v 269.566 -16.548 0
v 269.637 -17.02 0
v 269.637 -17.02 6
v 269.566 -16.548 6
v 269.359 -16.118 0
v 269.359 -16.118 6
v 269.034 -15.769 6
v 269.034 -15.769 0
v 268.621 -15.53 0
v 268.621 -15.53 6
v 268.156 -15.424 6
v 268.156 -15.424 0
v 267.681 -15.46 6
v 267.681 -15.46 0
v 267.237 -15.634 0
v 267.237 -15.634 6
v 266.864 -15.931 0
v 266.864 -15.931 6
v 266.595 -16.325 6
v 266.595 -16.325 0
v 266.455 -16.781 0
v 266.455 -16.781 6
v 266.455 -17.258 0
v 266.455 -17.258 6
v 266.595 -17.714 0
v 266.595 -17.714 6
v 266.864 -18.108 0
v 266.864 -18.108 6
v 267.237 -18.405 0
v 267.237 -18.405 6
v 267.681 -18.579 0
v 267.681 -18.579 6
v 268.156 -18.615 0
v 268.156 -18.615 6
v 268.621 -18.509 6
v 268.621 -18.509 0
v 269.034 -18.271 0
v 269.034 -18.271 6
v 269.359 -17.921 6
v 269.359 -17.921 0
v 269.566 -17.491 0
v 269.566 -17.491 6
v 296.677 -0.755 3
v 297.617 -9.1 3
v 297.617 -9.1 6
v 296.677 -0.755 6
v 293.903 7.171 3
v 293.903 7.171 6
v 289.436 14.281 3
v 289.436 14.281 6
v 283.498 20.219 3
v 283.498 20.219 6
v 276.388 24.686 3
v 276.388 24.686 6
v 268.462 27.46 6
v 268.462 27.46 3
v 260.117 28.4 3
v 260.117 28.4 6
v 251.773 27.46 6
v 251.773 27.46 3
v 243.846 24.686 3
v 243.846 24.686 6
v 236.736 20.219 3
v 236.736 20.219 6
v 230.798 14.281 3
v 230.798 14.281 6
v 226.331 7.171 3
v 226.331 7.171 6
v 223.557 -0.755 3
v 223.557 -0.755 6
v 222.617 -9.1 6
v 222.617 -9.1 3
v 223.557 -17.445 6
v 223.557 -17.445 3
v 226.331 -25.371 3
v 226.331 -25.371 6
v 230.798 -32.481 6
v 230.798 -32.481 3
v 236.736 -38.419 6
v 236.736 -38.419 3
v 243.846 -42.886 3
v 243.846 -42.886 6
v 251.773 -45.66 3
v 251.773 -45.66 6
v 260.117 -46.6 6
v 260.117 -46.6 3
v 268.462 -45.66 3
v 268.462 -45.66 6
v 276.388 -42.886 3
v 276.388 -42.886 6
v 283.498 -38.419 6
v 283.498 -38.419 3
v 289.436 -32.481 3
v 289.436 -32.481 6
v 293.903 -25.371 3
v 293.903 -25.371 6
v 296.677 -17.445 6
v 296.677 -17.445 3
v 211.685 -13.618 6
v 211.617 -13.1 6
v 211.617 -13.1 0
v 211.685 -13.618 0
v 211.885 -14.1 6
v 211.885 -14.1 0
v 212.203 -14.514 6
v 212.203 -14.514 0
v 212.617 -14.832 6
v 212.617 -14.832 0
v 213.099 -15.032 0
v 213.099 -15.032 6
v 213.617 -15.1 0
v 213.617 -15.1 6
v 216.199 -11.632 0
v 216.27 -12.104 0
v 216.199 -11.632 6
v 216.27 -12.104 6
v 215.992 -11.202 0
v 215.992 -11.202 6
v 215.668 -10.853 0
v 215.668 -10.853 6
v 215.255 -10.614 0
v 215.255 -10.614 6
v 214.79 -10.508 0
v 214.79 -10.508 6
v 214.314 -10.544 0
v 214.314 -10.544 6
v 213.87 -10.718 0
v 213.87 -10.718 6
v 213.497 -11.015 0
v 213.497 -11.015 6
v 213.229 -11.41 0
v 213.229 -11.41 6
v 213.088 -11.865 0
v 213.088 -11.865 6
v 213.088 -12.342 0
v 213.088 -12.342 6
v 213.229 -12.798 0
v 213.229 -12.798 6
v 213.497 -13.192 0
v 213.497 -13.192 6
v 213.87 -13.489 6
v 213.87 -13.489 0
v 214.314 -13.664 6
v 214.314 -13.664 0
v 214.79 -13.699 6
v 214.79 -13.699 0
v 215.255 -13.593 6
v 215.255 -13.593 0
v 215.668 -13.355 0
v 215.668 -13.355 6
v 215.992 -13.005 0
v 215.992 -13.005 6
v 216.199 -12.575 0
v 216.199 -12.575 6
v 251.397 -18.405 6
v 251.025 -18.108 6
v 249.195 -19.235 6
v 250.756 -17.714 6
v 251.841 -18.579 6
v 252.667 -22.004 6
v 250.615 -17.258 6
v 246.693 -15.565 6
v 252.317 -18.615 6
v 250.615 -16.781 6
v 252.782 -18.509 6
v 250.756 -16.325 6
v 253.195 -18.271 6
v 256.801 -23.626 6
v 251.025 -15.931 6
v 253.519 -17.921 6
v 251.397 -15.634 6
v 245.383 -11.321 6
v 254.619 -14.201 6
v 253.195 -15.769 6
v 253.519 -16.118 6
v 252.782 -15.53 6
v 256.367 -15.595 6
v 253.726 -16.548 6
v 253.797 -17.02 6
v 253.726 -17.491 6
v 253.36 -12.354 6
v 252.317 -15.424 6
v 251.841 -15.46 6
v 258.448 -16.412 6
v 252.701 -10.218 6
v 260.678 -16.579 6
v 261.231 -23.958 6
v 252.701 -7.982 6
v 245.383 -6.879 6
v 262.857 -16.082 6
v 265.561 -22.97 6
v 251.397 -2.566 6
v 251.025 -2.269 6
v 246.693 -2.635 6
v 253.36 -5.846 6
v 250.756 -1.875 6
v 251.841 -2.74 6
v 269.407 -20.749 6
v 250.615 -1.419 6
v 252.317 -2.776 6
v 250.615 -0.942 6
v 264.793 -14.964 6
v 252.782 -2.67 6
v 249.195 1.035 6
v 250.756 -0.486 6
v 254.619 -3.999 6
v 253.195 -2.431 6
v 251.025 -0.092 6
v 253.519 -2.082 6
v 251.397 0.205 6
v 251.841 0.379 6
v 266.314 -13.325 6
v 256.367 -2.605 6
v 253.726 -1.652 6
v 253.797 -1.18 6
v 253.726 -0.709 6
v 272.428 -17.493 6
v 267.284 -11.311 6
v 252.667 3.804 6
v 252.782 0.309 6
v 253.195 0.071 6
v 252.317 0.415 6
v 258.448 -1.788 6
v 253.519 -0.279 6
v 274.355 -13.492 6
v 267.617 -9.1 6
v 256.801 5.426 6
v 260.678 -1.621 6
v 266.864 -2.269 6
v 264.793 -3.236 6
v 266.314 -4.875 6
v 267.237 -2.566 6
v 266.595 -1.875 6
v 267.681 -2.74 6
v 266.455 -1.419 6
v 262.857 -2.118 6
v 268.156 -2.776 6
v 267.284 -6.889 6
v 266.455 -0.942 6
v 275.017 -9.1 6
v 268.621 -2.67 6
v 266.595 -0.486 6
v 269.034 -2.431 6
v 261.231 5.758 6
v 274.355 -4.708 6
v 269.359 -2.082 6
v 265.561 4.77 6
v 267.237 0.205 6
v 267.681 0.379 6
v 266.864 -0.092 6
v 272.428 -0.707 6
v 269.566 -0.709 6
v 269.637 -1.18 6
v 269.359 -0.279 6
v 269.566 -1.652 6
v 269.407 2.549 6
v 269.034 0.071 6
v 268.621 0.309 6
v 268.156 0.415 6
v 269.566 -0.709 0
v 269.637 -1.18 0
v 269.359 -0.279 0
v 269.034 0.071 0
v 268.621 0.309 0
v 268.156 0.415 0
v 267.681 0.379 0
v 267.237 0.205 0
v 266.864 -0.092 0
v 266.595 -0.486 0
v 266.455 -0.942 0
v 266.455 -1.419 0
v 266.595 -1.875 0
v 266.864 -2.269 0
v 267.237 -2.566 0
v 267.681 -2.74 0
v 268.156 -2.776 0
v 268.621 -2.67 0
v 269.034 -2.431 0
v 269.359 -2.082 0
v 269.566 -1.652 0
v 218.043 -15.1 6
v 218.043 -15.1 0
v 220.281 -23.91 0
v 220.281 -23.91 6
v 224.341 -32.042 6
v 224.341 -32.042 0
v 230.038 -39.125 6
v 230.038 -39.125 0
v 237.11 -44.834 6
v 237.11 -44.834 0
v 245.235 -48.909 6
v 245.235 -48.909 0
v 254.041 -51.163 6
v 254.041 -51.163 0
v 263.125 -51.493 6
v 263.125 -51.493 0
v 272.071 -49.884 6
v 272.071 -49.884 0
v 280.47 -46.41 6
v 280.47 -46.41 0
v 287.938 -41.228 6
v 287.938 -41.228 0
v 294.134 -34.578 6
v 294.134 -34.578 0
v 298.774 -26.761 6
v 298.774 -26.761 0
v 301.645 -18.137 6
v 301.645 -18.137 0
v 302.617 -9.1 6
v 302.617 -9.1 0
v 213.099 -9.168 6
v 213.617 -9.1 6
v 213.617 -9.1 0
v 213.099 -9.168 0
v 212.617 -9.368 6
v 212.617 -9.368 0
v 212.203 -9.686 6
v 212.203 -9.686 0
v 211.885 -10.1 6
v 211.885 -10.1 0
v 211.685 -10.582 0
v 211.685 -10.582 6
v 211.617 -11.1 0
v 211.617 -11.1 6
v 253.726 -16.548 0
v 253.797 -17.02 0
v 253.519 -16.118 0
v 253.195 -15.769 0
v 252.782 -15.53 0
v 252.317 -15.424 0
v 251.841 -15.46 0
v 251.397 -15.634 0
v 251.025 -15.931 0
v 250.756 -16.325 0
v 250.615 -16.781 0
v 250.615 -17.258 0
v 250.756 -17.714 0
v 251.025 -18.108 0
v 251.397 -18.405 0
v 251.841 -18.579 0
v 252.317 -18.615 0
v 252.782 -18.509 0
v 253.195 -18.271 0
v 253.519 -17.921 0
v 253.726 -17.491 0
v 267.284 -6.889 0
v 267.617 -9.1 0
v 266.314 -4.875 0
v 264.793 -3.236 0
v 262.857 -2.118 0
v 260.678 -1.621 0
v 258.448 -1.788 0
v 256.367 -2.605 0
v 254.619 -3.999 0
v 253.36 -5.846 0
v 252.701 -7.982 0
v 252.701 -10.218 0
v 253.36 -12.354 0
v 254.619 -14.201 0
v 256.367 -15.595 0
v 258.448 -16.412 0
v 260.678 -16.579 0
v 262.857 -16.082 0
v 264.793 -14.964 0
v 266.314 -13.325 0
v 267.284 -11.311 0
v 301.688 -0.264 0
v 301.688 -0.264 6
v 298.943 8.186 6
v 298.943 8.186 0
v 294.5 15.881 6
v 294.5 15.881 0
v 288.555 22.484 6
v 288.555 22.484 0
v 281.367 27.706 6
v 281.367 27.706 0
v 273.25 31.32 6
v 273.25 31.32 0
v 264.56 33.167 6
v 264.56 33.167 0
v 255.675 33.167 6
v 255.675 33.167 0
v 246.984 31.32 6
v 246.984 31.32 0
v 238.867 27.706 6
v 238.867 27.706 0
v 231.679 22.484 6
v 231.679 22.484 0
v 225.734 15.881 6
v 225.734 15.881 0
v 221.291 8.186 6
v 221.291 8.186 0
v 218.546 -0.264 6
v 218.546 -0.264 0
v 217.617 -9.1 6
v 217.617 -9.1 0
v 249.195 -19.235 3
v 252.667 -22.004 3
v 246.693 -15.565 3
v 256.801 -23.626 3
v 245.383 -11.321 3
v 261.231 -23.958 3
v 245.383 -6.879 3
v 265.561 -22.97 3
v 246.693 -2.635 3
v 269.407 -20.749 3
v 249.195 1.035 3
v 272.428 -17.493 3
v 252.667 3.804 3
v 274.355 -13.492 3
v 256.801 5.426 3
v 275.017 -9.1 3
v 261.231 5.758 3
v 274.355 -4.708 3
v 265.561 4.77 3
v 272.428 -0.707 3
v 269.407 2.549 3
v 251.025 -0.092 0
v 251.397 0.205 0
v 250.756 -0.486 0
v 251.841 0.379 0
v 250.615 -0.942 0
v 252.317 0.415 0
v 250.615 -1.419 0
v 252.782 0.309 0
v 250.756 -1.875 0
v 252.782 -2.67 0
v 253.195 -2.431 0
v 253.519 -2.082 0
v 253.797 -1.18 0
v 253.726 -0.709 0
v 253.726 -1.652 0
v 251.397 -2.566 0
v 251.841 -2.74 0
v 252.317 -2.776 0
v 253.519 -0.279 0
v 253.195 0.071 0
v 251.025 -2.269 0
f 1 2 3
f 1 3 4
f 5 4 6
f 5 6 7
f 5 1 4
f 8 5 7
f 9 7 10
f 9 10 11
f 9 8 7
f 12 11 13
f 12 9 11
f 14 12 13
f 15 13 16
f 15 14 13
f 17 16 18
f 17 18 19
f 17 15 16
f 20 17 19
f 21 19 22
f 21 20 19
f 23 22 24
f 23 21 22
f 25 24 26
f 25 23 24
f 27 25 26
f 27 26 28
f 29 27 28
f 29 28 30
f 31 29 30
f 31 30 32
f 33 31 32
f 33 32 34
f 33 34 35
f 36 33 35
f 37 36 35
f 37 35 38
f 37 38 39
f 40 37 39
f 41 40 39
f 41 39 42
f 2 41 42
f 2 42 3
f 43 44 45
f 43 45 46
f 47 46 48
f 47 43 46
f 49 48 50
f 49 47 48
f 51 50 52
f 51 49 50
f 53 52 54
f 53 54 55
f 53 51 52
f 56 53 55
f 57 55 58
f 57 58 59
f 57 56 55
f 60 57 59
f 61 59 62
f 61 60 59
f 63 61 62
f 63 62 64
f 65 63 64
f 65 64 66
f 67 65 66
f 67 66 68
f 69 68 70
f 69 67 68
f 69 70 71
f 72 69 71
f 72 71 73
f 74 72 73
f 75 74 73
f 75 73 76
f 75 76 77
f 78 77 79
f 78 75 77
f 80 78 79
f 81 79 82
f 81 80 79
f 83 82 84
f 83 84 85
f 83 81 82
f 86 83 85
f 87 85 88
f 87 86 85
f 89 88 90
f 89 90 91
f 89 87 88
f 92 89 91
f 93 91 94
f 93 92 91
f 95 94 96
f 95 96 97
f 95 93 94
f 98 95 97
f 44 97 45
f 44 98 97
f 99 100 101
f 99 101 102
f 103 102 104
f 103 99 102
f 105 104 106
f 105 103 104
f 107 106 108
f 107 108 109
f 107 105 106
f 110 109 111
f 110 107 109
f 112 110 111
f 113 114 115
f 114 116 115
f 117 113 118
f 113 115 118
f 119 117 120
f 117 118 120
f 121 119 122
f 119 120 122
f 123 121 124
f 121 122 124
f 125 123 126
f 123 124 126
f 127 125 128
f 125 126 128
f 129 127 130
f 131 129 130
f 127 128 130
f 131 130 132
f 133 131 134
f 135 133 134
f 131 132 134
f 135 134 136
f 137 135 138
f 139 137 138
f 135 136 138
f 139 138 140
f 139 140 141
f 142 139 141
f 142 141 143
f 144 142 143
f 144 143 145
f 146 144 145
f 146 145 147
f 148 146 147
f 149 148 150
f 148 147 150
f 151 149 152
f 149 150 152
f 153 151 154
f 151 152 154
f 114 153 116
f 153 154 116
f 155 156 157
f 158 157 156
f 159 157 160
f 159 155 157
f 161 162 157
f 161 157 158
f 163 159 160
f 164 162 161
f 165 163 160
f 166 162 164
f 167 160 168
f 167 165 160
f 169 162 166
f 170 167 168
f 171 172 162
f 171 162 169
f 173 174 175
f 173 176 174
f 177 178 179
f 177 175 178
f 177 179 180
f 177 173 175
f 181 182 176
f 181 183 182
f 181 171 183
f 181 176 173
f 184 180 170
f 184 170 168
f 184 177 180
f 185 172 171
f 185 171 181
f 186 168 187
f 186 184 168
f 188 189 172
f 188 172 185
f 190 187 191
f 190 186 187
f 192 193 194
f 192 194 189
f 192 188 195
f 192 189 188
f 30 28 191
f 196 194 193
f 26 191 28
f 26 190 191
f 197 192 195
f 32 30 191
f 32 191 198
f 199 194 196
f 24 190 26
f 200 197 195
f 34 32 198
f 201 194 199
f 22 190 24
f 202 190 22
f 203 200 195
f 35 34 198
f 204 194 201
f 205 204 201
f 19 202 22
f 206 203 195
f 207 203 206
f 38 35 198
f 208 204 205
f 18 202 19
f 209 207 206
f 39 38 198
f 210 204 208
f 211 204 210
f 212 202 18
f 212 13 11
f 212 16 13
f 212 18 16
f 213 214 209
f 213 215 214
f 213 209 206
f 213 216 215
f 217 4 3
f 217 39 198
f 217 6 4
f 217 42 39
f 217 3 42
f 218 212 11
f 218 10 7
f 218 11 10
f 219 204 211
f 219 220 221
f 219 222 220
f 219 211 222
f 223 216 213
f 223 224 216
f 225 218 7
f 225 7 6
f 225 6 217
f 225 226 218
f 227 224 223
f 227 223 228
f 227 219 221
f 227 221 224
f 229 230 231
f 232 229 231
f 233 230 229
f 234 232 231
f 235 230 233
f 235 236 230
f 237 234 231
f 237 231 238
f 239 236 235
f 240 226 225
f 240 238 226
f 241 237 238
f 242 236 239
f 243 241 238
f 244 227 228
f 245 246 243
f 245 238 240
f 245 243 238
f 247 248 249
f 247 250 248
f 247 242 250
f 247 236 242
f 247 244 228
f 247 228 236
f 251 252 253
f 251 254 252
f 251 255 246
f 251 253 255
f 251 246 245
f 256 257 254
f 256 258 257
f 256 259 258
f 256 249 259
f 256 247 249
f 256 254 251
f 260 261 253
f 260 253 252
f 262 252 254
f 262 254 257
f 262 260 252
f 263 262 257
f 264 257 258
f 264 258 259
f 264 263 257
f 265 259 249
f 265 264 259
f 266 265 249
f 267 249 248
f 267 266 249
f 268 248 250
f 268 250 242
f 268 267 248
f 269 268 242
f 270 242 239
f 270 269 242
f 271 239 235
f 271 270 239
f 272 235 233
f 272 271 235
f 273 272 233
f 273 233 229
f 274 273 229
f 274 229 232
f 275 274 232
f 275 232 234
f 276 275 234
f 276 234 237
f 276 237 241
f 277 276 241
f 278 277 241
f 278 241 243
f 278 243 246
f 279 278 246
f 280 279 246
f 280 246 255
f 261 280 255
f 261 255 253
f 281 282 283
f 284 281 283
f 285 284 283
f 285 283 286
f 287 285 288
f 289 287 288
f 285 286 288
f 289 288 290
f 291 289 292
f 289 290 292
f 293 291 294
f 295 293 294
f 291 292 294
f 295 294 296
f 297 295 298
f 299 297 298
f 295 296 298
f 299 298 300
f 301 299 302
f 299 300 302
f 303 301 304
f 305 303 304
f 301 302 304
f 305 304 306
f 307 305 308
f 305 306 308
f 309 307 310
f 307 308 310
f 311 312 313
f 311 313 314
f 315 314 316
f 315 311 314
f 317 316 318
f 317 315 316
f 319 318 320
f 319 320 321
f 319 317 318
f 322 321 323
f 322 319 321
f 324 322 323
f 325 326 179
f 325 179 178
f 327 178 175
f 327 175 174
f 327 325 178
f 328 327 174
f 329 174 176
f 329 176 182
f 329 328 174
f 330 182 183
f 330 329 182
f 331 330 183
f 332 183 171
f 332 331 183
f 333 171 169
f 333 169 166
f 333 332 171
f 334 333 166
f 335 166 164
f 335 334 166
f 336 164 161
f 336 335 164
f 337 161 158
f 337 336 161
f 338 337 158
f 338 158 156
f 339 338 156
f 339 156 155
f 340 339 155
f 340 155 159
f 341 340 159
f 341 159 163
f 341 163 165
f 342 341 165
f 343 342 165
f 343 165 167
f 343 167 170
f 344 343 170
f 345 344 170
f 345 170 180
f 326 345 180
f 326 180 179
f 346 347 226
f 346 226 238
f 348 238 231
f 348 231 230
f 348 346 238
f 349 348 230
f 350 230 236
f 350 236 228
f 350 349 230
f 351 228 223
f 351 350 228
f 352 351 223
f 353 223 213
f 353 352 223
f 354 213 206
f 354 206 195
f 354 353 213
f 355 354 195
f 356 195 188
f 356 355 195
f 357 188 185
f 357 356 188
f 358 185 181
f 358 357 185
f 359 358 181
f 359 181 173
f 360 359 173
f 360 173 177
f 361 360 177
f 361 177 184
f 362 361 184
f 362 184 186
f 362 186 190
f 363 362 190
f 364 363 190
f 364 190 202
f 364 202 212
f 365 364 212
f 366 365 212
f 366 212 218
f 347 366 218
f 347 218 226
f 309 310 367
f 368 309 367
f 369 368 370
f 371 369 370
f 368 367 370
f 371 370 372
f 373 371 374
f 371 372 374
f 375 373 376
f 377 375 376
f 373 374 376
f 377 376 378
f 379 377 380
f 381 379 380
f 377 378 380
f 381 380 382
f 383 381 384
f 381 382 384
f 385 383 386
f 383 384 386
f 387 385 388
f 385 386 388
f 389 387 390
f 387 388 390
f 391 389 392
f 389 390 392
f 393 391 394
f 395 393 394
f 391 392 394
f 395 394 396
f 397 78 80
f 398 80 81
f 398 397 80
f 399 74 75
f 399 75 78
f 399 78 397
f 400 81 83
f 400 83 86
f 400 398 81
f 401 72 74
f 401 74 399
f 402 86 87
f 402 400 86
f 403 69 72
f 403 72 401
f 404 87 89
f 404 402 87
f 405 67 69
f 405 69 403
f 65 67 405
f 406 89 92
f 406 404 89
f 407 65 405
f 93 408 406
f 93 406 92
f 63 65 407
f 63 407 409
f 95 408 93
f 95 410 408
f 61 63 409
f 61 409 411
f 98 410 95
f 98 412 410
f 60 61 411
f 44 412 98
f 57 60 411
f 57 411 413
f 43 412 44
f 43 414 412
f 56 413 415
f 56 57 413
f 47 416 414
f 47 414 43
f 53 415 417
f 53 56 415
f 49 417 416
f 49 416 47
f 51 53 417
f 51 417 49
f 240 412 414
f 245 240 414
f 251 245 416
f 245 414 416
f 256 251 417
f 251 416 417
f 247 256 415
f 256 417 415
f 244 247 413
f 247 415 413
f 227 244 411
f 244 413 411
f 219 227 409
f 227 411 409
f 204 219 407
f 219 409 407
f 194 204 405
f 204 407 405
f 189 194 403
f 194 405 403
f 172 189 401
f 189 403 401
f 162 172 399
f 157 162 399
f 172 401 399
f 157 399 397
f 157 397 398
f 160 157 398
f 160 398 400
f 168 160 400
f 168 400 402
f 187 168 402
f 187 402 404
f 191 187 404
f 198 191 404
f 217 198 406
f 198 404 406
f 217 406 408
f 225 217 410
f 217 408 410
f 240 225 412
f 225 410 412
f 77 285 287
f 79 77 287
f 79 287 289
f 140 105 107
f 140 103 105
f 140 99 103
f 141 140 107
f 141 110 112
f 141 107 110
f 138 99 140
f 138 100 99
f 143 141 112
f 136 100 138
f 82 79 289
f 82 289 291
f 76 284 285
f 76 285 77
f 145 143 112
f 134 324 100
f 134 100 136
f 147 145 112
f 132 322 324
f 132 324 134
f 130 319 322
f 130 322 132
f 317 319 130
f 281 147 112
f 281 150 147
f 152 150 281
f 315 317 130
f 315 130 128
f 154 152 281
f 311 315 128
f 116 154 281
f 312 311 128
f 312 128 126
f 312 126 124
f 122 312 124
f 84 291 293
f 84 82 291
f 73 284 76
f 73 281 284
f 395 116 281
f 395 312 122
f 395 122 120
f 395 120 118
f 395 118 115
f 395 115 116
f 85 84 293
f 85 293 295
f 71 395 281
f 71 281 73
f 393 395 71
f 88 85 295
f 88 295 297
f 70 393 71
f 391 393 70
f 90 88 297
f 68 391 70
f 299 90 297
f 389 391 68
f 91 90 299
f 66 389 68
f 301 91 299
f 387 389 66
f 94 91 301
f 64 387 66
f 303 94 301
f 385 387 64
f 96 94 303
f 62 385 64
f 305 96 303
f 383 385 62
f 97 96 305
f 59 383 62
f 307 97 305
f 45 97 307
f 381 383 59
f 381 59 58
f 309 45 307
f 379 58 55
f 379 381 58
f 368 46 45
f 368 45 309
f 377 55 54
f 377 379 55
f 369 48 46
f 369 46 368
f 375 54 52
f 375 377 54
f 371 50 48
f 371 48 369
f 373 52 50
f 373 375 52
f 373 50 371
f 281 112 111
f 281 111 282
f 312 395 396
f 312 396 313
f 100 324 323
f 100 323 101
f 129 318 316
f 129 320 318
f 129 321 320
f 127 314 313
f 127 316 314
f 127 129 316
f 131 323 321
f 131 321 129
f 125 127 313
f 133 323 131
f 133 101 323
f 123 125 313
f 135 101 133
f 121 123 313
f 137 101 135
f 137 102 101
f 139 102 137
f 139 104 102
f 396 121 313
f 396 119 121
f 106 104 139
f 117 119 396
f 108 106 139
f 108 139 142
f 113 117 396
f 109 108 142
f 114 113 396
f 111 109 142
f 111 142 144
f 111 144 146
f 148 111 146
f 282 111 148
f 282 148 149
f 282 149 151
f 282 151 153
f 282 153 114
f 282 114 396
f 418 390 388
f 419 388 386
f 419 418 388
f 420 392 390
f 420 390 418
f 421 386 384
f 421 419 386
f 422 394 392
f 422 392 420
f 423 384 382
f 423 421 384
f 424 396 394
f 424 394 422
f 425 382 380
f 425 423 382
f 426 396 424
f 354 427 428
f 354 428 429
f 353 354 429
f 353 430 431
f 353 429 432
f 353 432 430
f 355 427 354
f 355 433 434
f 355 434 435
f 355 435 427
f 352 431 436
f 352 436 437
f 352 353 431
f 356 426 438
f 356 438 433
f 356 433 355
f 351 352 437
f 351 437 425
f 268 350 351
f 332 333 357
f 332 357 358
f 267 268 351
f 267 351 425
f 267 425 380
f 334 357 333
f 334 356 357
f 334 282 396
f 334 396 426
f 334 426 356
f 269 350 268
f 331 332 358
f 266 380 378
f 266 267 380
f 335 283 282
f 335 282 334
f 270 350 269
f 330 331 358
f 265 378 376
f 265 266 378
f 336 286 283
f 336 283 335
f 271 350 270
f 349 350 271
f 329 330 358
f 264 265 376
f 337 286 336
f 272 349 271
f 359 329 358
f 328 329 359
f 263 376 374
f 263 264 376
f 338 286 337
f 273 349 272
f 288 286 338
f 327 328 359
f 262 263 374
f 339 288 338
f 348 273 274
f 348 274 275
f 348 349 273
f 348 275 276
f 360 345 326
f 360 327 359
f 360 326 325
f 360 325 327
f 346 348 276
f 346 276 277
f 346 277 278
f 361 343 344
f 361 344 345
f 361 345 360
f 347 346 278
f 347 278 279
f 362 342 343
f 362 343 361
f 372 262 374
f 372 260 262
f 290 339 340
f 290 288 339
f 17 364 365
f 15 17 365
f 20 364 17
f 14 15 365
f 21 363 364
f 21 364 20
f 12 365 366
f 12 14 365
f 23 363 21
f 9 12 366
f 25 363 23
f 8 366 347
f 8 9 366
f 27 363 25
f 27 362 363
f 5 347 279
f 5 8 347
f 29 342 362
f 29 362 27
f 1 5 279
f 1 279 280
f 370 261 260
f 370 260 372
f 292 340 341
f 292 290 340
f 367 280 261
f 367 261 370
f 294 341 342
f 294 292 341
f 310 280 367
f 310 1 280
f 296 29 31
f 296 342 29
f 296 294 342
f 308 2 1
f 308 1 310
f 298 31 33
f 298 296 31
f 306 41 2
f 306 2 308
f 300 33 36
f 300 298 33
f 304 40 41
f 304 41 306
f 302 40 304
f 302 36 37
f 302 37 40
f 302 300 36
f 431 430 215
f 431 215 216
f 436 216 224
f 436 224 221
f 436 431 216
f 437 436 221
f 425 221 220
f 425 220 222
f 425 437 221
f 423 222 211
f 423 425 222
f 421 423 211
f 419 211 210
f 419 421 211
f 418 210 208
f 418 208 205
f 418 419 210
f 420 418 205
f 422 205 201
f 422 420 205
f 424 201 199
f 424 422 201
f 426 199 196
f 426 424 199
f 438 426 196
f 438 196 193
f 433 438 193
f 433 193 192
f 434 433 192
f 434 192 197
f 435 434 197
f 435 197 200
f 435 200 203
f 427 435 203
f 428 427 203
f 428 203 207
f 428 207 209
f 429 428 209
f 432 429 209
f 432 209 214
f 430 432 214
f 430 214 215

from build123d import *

# Parameters (mm, degrees)
SKETCH1_R                       = 42.5
SKETCH1_R_2                     = 1.6
SKETCH1_R_3                     = 7.5
BOSS_EXTRUDE1_DEPTH             = 3
SKETCH3_R                       = 42.5
SKETCH3_R_2                     = 37.5
SKETCH3_R_3                     = 14.9
SKETCH3_R_4                     = 1.6
SKETCH3_R_5                     = 7.5
BOSS_EXTRUDE2_DEPTH             = 3
BOSS_EXTRUDE3_REACH             = 308.999
SKETCH4_R                       = 1.6
BOSS_EXTRUDE3_DIRECTION_2_REACH = 308.999


with BuildPart() as part:
    # Sketch1 → Boss-Extrude1 (new body)
    with BuildSketch(Plane.XY):
        with Locations((260.117045421, -9.1)):
            Circle(SKETCH1_R)
        with Locations((252.197449472, -1.180404051)):
            Circle(SKETCH1_R_2, mode=Mode.SUBTRACT)
        with Locations((268.036641371, -1.180404051)):
            Circle(SKETCH1_R_2, mode=Mode.SUBTRACT)
        with Locations((252.197449472, -17.019595949)):
            Circle(SKETCH1_R_2, mode=Mode.SUBTRACT)
        with Locations((268.036641371, -17.019595949)):
            Circle(SKETCH1_R_2, mode=Mode.SUBTRACT)
        with Locations((260.117045421, -9.1)):
            Circle(SKETCH1_R_3, mode=Mode.SUBTRACT)
    extrude(amount=BOSS_EXTRUDE1_DEPTH)

    # Sketch3 → Boss-Extrude2 (add)
    # profile 1 of 2: a face of its own
    with BuildSketch(Plane.XY.offset(3)):
        with Locations((260.117045421, -9.1)):
            Circle(SKETCH3_R)
        with Locations((260.117045421, -9.1)):
            Circle(SKETCH3_R_2, mode=Mode.SUBTRACT)
    # profile 2 of 2: a face of its own
    with BuildSketch(Plane.XY.offset(3)):
        with Locations((260.117045421, -9.1)):
            Circle(SKETCH3_R_3)
        with Locations((252.197449472, -17.019595949)):
            Circle(SKETCH3_R_4, mode=Mode.SUBTRACT)
        with Locations((268.036641371, -1.180404051)):
            Circle(SKETCH3_R_4, mode=Mode.SUBTRACT)
        with Locations((268.036641371, -17.019595949)):
            Circle(SKETCH3_R_4, mode=Mode.SUBTRACT)
        with Locations((260.117045421, -9.1)):
            Circle(SKETCH3_R_5, mode=Mode.SUBTRACT)
        with Locations((252.197449472, -1.180404051)):
            Circle(SKETCH3_R_4, mode=Mode.SUBTRACT)
    extrude(amount=BOSS_EXTRUDE2_DEPTH)

    # Boss-Extrude3: up to this face of the body (flat: up to its plane)
    boss_extrude3_end = Plane(part.part.faces().sort_by_distance((218.819126949, -9.1, 6))[0])
    # Sketch4 → Boss-Extrude3 (add, up to the picked face)
    with BuildSketch(Plane.XY.offset(3), mode=Mode.PRIVATE) as boss_extrude3_sk1:
        with BuildLine():
            Line((217.617045421, -9.1), (213.617045421, -9.1))
            ThreePointArc((213.617045421, -9.1), (212.202831859, -9.685786438), (211.617045421, -11.1))
            Line((211.617045421, -11.1), (211.617045421, -13.1))
            ThreePointArc((211.617045421, -13.1), (212.202831859, -14.514213562), (213.617045421, -15.1))
            Line((213.617045421, -15.1), (218.042706448, -15.1))
            ThreePointArc((218.042706448, -15.1), (217.723594239, -12.107539996), (217.617045421, -9.1))
        make_face()
        with Locations((214.67031983, -12.103769998)):
            Circle(SKETCH4_R, mode=Mode.SUBTRACT)
    boss_extrude3_tool1 = split(extrude(boss_extrude3_sk1.sketch, amount=BOSS_EXTRUDE3_REACH, mode=Mode.PRIVATE), bisect_by=boss_extrude3_end, keep=Keep.BOTH, mode=Mode.PRIVATE)
    add(boss_extrude3_tool1.solids().sort_by(Axis((215.617045, -9.187914, 3), (0, 0, 1)))[0])

    # Boss-Extrude3 direction 2: up to this face of the body (flat: up to its plane)
    boss_extrude3_direction_2_end = Plane(part.part.faces().sort_by_distance((218.819126949, -9.1, 0))[0])
    # Sketch4 → Boss-Extrude3 direction 2 (add, up to the picked face)
    with BuildSketch(Plane.XY.offset(3), mode=Mode.PRIVATE) as boss_extrude3_direction_2_sk1:
        with BuildLine():
            Line((217.617045421, -9.1), (213.617045421, -9.1))
            ThreePointArc((213.617045421, -9.1), (212.202831859, -9.685786438), (211.617045421, -11.1))
            Line((211.617045421, -11.1), (211.617045421, -13.1))
            ThreePointArc((211.617045421, -13.1), (212.202831859, -14.514213562), (213.617045421, -15.1))
            Line((213.617045421, -15.1), (218.042706448, -15.1))
            ThreePointArc((218.042706448, -15.1), (217.723594239, -12.107539996), (217.617045421, -9.1))
        make_face()
        with Locations((214.67031983, -12.103769998)):
            Circle(SKETCH4_R, mode=Mode.SUBTRACT)
    boss_extrude3_direction_2_tool1 = split(extrude(boss_extrude3_direction_2_sk1.sketch, amount=-BOSS_EXTRUDE3_DIRECTION_2_REACH, mode=Mode.PRIVATE), bisect_by=boss_extrude3_direction_2_end, keep=Keep.BOTH, mode=Mode.PRIVATE)
    add(boss_extrude3_direction_2_tool1.solids().sort_by(Axis((215.617045, -9.187914, 3), (0, 0, -1)))[0])


solid = part.part
